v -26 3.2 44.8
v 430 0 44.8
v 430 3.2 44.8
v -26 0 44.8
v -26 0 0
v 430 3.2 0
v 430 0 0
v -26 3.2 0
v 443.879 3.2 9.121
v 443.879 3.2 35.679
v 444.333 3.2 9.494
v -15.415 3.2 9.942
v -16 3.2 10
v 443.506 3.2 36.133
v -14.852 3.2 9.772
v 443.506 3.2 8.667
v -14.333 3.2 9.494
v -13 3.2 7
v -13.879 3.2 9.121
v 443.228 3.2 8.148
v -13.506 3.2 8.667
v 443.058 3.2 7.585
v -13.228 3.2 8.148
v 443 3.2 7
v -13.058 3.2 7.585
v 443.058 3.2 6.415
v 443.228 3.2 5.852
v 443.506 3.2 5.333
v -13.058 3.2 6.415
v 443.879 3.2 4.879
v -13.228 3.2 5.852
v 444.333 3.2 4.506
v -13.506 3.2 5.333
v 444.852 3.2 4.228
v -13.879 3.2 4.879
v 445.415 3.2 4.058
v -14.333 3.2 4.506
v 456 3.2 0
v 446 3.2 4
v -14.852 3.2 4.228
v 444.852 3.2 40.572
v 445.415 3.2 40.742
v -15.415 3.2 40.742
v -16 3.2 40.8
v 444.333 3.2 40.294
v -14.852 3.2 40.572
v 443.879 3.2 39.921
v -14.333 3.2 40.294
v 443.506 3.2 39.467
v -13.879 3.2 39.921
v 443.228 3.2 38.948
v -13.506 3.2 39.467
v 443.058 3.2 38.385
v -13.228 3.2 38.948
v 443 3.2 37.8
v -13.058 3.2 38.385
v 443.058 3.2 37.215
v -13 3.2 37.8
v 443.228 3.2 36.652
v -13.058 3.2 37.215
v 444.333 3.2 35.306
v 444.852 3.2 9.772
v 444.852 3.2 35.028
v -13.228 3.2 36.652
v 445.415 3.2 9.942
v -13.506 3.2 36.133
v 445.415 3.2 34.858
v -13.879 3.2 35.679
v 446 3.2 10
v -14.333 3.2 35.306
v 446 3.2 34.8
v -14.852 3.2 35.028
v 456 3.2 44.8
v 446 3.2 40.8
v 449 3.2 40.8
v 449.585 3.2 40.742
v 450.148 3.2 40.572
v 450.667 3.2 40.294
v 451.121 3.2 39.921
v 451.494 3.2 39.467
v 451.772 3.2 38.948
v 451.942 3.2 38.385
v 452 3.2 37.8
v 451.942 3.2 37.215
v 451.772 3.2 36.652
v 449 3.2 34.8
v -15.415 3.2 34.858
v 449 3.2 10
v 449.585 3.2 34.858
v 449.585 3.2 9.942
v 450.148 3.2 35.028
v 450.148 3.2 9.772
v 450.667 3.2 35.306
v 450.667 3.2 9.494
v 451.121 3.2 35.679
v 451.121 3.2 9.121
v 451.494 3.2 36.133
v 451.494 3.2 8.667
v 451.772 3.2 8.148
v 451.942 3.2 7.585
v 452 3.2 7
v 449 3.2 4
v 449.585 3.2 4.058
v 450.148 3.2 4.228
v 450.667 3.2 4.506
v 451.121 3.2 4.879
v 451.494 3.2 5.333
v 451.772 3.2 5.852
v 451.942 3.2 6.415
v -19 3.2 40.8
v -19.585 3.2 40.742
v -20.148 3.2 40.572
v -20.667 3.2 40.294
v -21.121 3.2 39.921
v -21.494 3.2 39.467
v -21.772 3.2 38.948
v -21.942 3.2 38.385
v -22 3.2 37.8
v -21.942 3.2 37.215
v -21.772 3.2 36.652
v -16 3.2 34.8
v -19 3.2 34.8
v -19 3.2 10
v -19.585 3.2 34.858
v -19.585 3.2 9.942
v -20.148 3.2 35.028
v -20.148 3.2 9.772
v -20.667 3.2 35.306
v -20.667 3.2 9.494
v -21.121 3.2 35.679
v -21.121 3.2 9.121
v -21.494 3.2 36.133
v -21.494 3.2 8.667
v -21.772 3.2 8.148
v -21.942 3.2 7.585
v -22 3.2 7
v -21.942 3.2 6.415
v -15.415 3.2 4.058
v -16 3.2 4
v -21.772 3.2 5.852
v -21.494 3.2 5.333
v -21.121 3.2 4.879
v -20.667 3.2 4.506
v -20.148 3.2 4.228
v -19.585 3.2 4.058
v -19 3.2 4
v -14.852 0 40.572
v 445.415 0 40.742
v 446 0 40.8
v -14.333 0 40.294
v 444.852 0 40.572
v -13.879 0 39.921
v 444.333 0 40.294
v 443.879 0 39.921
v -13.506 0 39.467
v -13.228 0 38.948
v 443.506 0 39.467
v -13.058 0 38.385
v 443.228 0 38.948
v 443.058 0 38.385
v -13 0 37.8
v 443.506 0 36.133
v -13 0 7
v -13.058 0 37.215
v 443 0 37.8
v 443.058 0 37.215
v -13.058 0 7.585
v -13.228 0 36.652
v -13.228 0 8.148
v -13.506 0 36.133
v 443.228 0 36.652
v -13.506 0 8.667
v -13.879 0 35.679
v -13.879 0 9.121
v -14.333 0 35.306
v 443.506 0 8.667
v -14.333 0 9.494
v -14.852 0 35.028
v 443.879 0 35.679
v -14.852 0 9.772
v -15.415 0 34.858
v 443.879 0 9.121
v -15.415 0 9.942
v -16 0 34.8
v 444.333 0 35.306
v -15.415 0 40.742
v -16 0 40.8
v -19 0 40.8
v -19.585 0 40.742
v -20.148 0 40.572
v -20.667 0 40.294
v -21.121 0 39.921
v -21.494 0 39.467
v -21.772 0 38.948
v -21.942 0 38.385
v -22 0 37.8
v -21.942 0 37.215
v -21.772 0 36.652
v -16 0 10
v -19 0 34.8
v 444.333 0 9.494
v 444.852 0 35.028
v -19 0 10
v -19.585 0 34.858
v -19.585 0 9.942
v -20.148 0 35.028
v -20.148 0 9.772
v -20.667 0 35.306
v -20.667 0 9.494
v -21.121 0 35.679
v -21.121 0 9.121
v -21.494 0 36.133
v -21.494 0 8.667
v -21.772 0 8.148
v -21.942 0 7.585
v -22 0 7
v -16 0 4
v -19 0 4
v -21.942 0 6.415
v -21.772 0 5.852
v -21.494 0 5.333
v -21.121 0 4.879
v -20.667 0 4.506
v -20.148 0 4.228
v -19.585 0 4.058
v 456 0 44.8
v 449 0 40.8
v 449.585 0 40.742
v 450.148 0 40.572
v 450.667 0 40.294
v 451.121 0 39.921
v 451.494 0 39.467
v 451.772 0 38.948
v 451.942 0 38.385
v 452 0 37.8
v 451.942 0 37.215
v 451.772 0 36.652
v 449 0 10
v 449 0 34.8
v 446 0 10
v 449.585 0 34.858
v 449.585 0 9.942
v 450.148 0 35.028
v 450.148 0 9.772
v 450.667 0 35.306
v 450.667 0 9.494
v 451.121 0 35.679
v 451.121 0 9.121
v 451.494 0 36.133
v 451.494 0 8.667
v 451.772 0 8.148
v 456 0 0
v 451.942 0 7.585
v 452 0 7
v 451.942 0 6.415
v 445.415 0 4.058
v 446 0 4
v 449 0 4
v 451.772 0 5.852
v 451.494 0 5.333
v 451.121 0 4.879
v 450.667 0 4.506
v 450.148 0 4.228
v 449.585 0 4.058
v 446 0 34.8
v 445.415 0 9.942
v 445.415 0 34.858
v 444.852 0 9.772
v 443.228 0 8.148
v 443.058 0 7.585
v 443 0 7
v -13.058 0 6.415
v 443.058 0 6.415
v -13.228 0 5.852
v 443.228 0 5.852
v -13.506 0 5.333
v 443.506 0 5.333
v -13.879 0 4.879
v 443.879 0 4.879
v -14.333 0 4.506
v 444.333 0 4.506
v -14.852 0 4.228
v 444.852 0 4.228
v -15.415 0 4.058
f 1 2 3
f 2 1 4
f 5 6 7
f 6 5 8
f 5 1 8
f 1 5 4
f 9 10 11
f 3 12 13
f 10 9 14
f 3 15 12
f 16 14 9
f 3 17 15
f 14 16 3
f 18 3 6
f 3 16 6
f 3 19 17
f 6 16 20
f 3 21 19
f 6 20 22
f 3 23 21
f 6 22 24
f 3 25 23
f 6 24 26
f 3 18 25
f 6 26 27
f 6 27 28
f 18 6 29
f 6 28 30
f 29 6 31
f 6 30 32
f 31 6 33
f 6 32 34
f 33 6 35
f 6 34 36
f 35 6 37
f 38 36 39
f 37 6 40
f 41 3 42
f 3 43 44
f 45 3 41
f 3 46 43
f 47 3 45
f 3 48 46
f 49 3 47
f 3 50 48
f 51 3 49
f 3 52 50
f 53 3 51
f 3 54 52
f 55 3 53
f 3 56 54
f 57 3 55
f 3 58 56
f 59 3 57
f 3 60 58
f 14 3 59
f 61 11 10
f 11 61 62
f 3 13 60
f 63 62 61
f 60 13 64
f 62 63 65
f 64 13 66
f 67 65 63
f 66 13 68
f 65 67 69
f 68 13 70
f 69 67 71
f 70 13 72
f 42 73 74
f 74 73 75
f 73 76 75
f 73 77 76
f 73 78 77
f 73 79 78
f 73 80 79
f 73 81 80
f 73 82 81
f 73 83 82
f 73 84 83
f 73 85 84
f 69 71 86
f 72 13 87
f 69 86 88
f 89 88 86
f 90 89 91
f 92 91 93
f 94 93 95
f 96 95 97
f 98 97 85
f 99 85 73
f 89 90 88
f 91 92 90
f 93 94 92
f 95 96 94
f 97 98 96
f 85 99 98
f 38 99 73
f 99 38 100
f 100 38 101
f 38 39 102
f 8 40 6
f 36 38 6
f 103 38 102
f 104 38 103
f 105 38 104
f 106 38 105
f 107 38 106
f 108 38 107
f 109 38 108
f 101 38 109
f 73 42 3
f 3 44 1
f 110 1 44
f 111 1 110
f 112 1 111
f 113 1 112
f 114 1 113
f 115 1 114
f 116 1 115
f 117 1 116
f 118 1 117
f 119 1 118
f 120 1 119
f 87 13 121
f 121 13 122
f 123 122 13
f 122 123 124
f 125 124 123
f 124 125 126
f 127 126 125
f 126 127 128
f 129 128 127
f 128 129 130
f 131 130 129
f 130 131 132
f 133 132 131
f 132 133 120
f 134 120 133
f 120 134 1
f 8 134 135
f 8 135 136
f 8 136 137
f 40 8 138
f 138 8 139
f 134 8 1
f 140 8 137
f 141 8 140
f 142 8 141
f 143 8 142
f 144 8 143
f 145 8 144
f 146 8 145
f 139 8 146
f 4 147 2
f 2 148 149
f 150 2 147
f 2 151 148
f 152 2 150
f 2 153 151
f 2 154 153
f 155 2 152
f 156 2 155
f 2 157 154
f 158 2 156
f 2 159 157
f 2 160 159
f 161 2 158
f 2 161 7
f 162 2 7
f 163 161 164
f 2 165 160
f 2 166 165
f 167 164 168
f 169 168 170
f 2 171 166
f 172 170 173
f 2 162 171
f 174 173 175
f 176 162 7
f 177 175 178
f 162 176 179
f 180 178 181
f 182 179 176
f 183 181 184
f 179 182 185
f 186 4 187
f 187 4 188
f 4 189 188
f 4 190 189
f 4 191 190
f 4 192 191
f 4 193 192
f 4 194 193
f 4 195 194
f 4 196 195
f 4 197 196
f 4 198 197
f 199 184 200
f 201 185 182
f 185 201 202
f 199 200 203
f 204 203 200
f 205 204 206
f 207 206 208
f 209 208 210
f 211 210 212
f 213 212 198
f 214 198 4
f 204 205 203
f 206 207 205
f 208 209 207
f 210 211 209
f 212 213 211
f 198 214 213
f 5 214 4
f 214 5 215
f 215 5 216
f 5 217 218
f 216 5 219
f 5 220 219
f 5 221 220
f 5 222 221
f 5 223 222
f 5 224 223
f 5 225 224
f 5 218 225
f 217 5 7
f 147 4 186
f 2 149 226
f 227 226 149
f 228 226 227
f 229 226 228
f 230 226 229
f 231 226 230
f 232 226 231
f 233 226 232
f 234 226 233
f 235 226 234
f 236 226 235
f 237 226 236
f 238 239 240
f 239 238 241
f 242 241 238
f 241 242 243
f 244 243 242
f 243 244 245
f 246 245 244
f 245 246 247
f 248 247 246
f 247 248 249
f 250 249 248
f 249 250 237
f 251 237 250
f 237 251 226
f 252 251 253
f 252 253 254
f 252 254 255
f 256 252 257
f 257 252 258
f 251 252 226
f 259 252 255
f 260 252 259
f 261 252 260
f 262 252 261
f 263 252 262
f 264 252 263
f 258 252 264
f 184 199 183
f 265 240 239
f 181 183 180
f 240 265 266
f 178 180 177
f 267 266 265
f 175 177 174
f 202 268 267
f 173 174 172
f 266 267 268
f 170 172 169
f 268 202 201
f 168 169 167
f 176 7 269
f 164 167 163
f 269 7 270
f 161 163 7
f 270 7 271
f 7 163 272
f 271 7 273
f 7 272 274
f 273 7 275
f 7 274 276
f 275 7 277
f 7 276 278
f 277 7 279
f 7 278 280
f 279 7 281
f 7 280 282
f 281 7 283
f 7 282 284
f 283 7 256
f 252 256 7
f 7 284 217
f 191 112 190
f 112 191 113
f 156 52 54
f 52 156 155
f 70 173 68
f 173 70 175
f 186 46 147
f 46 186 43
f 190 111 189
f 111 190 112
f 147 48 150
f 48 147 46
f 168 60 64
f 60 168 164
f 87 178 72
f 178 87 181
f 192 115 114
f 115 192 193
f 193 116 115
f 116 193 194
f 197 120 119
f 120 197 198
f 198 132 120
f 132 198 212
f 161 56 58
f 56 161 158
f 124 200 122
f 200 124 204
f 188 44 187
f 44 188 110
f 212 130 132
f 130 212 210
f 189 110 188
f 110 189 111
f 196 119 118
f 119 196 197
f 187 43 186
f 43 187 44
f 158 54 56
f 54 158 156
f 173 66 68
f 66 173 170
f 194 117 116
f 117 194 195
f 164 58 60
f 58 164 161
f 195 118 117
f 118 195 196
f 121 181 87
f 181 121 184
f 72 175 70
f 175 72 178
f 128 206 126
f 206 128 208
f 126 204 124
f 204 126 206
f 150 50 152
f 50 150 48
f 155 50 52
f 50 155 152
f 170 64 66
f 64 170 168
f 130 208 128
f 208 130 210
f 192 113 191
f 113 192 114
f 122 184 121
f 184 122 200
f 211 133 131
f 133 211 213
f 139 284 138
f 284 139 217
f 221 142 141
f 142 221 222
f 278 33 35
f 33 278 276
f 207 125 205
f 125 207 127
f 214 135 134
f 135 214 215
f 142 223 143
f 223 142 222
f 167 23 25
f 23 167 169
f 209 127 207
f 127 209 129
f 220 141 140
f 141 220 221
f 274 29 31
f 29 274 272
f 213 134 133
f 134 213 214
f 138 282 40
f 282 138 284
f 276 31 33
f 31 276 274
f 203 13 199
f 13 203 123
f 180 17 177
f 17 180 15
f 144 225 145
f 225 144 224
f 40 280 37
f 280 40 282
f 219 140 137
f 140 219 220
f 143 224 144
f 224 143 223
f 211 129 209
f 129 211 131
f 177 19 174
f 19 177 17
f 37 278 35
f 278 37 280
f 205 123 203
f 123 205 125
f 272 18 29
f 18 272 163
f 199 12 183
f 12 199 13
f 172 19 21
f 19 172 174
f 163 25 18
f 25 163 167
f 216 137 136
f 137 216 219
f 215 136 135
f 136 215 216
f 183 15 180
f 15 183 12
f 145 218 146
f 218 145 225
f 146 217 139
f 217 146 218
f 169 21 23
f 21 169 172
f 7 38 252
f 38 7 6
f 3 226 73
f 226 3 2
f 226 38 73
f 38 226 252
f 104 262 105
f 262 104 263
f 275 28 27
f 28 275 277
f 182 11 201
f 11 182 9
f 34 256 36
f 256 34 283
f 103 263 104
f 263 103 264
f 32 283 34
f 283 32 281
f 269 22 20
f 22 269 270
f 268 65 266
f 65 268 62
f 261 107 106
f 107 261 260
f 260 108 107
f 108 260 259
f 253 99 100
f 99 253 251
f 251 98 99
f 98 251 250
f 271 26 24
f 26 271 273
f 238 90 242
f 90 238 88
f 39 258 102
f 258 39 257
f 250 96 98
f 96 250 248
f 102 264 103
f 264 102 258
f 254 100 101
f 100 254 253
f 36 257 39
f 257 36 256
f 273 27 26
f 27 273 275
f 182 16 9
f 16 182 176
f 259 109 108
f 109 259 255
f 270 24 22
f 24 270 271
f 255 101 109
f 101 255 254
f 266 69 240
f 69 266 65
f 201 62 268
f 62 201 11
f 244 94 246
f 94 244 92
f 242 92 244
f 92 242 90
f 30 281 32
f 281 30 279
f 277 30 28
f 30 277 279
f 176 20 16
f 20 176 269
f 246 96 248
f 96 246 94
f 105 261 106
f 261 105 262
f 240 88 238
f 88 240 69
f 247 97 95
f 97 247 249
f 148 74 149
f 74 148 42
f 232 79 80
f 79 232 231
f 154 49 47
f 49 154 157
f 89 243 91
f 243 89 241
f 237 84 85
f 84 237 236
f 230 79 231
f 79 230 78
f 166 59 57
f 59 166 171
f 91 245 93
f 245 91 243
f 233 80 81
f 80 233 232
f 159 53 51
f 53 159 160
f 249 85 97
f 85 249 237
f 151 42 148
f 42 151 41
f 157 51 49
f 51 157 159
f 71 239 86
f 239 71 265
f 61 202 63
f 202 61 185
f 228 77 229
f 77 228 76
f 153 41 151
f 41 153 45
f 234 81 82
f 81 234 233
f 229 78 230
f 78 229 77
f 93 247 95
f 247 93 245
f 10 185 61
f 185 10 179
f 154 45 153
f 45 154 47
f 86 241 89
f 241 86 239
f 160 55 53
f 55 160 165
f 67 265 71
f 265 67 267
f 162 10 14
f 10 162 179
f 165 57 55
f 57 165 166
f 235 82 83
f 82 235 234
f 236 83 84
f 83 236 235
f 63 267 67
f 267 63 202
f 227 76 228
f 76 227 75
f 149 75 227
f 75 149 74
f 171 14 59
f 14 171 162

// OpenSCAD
// file: modules/utils.scad
////////////////////////////////////////////////////////////////////////////////////////////////////////////////////////

BUILD_PLATE_X = 256.0;
BUILD_PLATE_Y = 256.0;
BUILD_PLATE_Z = 256.0;

BUILD_PREVIEW_WIDTH = 0.01;

DIFFERENCE_CLEARANCE = 0.01;

////////////////////////////////////////////////////////////////////////////////////////////////////////////////////////
// show a preview of the build plate

module BuildPlatePreview()
{
    % translate([ 0, 0, -BUILD_PREVIEW_WIDTH ])
        cube([ BUILD_PLATE_X, BUILD_PLATE_Y, BUILD_PREVIEW_WIDTH ]);
}

////////////////////////////////////////////////////////////////////////////////////////////////////////////////////////
// list, sum and spacing functions

// sum up the values in the given list
function sumList( list ) = _sumListHelper( list, 0 );
function _sumListHelper( list, n ) = n >= len( list ) ? 0 : list[ n ] + _sumListHelper( list, n + 1 );

// sum up the values in the given list from indicies 0..i (inclusive)
function sumTo( list, i ) = _sumToHelper( list, i, 0 );
function _sumToHelper( list, i, n ) = n >= i || n >= len( list ) ? 0 : list[ n ] + _sumToHelper( list, i, n + 1 );

// adds val_to_add to each index of the given list, returning a new list
function addValueToEachIndex( list, val_to_add ) = [ for( entry = list ) entry + val_to_add ];

// for each size in list, adds up the size and the equally spaces them in the total_size with the given clearance factored in
function calculateEquallySpacedOffset( list, total_size, clearance, i ) =
    let( sizes_with_clearance = addValueToEachIndex( list, clearance * 2 ) )
    let( spacing = ( total_size - sumList( sizes_with_clearance ) ) / ( len( list ) + 1 ) )
    spacing * ( i + 1 ) + sumTo( sizes_with_clearance, i );

// function calculateEquallySpacedOffset( total_size, count, i, item_size ) = ( i + 1 ) / ( count + 1 ) * total_size - item_size / 2;

function calculateOffsetToCenter( total_size, item_size ) = total_size / 2 - item_size / 2;

////////////////////////////////////////////////////////////////////////////////////////////////////////////////////////
// rotate so that we can draw an object from one point to the next

module RotateFromPointAtoB( a, b )
{
    // from: https://en.wikibooks.org/wiki/OpenSCAD_User_Manual/Transformations

    x = b[ 0 ]- a[ 0 ];
    y = b[ 1 ]- a[ 1 ];
    z = b[ 2 ]- a[ 2 ];

    length = norm([ x, y, z ]);
    b = acos( z / length );
    c = atan2( y, x );

    rotate([ 0, b, c ])
        children();
}

////////////////////////////////////////////////////////////////////////////////////////////////////////////////////////
// file: modules/network-rack.scad
////////////////////////////////////////////////////////////////////////////////////////////////////////////////////////

include <utils.scad>

////////////////////////////////////////////////////////////////////////////////////////////////////////////////////////

NETWORK_RACK_MODULE_1U_Z = 44.8;
NETWORK_RACK_MODULE_INSIDE_X = 430.0;
NETWORK_RACK_MODULE_EAR_X = ( 482 - NETWORK_RACK_MODULE_INSIDE_X ) / 2;

NETWORK_RACK_MODULE_EAR_HOLE_OFFSET_X = 4.0;
NETWORK_RACK_MODULE_EAR_HOLE_X = 11.0;

NETWORK_RACK_MODULE_EAR_HOLE_OFFSET_Z = 7.0;
NETWORK_RACK_MODULE_EAR_HOLE_R = 3.0;

NETWORK_RACK_MODULE_FACE_Y = 3.2;

////////////////////////////////////////////////////////////////////////////////////////////////////////////////////////

module NetworkRackModule1U( width_quarters, left_ear = false, right_ear = false )
{
    x = NETWORK_RACK_MODULE_INSIDE_X / 4 * width_quarters;

    // face
    cube([ x, NETWORK_RACK_MODULE_FACE_Y, NETWORK_RACK_MODULE_1U_Z ]);

    // left ear
    if( left_ear )
    {
        NetworkRackModule1UEar();
    }

    // right ear
    if( right_ear )
    {
        translate([ x, 0, NETWORK_RACK_MODULE_1U_Z ])
            rotate([ 0, 180, 0 ])
                NetworkRackModule1UEar();
    }

}

////////////////////////////////////////////////////////////////////////////////////////////////////////////////////////

module NetworkRackModule1UEar()
{
    ear_hole_top_z = NETWORK_RACK_MODULE_1U_Z - NETWORK_RACK_MODULE_EAR_HOLE_OFFSET_Z;
    ear_hole_bottom_z = NETWORK_RACK_MODULE_EAR_HOLE_OFFSET_Z;

    // TODO: round?
    difference()
    {
        translate([ -NETWORK_RACK_MODULE_EAR_X, 0, 0 ])
            cube([ NETWORK_RACK_MODULE_EAR_X, NETWORK_RACK_MODULE_FACE_Y, NETWORK_RACK_MODULE_1U_Z ]);

        // top ear hole
        hull()
        {
            translate([
                -NETWORK_RACK_MODULE_EAR_X + NETWORK_RACK_MODULE_EAR_HOLE_OFFSET_X + NETWORK_RACK_MODULE_EAR_HOLE_R,
                NETWORK_RACK_MODULE_FACE_Y + DIFFERENCE_CLEARANCE,
                ear_hole_top_z ])
                rotate([ 90, 0, 0 ])
                    cylinder(
                        r = NETWORK_RACK_MODULE_EAR_HOLE_R,
                        h = NETWORK_RACK_MODULE_FACE_Y + DIFFERENCE_CLEARANCE * 2,
                        $fn = 32 );
            translate([
                -NETWORK_RACK_MODULE_EAR_X + NETWORK_RACK_MODULE_EAR_HOLE_X - NETWORK_RACK_MODULE_EAR_HOLE_OFFSET_X + NETWORK_RACK_MODULE_EAR_HOLE_R,
                NETWORK_RACK_MODULE_FACE_Y + DIFFERENCE_CLEARANCE,
                ear_hole_top_z ])
                rotate([ 90, 0, 0 ])
                    cylinder(
                        r = NETWORK_RACK_MODULE_EAR_HOLE_R,
                        h = NETWORK_RACK_MODULE_FACE_Y + DIFFERENCE_CLEARANCE * 2,
                        $fn = 32 );
        }

        // bottom ear hole
        hull()
        {
            translate([
                -NETWORK_RACK_MODULE_EAR_X + NETWORK_RACK_MODULE_EAR_HOLE_OFFSET_X + NETWORK_RACK_MODULE_EAR_HOLE_R,
                NETWORK_RACK_MODULE_FACE_Y + DIFFERENCE_CLEARANCE,
                ear_hole_bottom_z ])
                rotate([ 90, 0, 0 ])
                    cylinder(
                        r = NETWORK_RACK_MODULE_EAR_HOLE_R,
                        h = NETWORK_RACK_MODULE_FACE_Y + DIFFERENCE_CLEARANCE * 2,
                        $fn = 32 );
            translate([
                -NETWORK_RACK_MODULE_EAR_X + NETWORK_RACK_MODULE_EAR_HOLE_X - NETWORK_RACK_MODULE_EAR_HOLE_OFFSET_X + NETWORK_RACK_MODULE_EAR_HOLE_R,
                NETWORK_RACK_MODULE_FACE_Y + DIFFERENCE_CLEARANCE,
                ear_hole_bottom_z ])
                rotate([ 90, 0, 0 ])
                    cylinder(
                        r = NETWORK_RACK_MODULE_EAR_HOLE_R,
                        h = NETWORK_RACK_MODULE_FACE_Y + DIFFERENCE_CLEARANCE * 2,
                        $fn = 32 );
        }
    }
}

////////////////////////////////////////////////////////////////////////////////////////////////////////////////////////
// main file
////////////////////////////////////////////////////////////////////////////////////////////////////////////////////////

include <modules/network-rack.scad>

////////////////////////////////////////////////////////////////////////////////////////////////////////////////////////
// measurements

odroid_n2plus_x = 91.0;
odroid_n2plus_y = 100.0;
odroid_n2plus_z = 28.0;

////////////////////////////////////////////////////////////////////////////////////////////////////////////////////////
// settings

render_mode = "preview";
// render_mode = "print";

////////////////////////////////////////////////////////////////////////////////////////////////////////////////////////
// calculations

////////////////////////////////////////////////////////////////////////////////////////////////////////////////////////
// models

% cube([ 430, 150, 44.8 ]);

NetworkRackModule1U( 4, true, true );

////////////////////////////////////////////////////////////////////////////////////////////////////////////////////////

////////////////////////////////////////////////////////////////////////////////////////////////////////////////////////
